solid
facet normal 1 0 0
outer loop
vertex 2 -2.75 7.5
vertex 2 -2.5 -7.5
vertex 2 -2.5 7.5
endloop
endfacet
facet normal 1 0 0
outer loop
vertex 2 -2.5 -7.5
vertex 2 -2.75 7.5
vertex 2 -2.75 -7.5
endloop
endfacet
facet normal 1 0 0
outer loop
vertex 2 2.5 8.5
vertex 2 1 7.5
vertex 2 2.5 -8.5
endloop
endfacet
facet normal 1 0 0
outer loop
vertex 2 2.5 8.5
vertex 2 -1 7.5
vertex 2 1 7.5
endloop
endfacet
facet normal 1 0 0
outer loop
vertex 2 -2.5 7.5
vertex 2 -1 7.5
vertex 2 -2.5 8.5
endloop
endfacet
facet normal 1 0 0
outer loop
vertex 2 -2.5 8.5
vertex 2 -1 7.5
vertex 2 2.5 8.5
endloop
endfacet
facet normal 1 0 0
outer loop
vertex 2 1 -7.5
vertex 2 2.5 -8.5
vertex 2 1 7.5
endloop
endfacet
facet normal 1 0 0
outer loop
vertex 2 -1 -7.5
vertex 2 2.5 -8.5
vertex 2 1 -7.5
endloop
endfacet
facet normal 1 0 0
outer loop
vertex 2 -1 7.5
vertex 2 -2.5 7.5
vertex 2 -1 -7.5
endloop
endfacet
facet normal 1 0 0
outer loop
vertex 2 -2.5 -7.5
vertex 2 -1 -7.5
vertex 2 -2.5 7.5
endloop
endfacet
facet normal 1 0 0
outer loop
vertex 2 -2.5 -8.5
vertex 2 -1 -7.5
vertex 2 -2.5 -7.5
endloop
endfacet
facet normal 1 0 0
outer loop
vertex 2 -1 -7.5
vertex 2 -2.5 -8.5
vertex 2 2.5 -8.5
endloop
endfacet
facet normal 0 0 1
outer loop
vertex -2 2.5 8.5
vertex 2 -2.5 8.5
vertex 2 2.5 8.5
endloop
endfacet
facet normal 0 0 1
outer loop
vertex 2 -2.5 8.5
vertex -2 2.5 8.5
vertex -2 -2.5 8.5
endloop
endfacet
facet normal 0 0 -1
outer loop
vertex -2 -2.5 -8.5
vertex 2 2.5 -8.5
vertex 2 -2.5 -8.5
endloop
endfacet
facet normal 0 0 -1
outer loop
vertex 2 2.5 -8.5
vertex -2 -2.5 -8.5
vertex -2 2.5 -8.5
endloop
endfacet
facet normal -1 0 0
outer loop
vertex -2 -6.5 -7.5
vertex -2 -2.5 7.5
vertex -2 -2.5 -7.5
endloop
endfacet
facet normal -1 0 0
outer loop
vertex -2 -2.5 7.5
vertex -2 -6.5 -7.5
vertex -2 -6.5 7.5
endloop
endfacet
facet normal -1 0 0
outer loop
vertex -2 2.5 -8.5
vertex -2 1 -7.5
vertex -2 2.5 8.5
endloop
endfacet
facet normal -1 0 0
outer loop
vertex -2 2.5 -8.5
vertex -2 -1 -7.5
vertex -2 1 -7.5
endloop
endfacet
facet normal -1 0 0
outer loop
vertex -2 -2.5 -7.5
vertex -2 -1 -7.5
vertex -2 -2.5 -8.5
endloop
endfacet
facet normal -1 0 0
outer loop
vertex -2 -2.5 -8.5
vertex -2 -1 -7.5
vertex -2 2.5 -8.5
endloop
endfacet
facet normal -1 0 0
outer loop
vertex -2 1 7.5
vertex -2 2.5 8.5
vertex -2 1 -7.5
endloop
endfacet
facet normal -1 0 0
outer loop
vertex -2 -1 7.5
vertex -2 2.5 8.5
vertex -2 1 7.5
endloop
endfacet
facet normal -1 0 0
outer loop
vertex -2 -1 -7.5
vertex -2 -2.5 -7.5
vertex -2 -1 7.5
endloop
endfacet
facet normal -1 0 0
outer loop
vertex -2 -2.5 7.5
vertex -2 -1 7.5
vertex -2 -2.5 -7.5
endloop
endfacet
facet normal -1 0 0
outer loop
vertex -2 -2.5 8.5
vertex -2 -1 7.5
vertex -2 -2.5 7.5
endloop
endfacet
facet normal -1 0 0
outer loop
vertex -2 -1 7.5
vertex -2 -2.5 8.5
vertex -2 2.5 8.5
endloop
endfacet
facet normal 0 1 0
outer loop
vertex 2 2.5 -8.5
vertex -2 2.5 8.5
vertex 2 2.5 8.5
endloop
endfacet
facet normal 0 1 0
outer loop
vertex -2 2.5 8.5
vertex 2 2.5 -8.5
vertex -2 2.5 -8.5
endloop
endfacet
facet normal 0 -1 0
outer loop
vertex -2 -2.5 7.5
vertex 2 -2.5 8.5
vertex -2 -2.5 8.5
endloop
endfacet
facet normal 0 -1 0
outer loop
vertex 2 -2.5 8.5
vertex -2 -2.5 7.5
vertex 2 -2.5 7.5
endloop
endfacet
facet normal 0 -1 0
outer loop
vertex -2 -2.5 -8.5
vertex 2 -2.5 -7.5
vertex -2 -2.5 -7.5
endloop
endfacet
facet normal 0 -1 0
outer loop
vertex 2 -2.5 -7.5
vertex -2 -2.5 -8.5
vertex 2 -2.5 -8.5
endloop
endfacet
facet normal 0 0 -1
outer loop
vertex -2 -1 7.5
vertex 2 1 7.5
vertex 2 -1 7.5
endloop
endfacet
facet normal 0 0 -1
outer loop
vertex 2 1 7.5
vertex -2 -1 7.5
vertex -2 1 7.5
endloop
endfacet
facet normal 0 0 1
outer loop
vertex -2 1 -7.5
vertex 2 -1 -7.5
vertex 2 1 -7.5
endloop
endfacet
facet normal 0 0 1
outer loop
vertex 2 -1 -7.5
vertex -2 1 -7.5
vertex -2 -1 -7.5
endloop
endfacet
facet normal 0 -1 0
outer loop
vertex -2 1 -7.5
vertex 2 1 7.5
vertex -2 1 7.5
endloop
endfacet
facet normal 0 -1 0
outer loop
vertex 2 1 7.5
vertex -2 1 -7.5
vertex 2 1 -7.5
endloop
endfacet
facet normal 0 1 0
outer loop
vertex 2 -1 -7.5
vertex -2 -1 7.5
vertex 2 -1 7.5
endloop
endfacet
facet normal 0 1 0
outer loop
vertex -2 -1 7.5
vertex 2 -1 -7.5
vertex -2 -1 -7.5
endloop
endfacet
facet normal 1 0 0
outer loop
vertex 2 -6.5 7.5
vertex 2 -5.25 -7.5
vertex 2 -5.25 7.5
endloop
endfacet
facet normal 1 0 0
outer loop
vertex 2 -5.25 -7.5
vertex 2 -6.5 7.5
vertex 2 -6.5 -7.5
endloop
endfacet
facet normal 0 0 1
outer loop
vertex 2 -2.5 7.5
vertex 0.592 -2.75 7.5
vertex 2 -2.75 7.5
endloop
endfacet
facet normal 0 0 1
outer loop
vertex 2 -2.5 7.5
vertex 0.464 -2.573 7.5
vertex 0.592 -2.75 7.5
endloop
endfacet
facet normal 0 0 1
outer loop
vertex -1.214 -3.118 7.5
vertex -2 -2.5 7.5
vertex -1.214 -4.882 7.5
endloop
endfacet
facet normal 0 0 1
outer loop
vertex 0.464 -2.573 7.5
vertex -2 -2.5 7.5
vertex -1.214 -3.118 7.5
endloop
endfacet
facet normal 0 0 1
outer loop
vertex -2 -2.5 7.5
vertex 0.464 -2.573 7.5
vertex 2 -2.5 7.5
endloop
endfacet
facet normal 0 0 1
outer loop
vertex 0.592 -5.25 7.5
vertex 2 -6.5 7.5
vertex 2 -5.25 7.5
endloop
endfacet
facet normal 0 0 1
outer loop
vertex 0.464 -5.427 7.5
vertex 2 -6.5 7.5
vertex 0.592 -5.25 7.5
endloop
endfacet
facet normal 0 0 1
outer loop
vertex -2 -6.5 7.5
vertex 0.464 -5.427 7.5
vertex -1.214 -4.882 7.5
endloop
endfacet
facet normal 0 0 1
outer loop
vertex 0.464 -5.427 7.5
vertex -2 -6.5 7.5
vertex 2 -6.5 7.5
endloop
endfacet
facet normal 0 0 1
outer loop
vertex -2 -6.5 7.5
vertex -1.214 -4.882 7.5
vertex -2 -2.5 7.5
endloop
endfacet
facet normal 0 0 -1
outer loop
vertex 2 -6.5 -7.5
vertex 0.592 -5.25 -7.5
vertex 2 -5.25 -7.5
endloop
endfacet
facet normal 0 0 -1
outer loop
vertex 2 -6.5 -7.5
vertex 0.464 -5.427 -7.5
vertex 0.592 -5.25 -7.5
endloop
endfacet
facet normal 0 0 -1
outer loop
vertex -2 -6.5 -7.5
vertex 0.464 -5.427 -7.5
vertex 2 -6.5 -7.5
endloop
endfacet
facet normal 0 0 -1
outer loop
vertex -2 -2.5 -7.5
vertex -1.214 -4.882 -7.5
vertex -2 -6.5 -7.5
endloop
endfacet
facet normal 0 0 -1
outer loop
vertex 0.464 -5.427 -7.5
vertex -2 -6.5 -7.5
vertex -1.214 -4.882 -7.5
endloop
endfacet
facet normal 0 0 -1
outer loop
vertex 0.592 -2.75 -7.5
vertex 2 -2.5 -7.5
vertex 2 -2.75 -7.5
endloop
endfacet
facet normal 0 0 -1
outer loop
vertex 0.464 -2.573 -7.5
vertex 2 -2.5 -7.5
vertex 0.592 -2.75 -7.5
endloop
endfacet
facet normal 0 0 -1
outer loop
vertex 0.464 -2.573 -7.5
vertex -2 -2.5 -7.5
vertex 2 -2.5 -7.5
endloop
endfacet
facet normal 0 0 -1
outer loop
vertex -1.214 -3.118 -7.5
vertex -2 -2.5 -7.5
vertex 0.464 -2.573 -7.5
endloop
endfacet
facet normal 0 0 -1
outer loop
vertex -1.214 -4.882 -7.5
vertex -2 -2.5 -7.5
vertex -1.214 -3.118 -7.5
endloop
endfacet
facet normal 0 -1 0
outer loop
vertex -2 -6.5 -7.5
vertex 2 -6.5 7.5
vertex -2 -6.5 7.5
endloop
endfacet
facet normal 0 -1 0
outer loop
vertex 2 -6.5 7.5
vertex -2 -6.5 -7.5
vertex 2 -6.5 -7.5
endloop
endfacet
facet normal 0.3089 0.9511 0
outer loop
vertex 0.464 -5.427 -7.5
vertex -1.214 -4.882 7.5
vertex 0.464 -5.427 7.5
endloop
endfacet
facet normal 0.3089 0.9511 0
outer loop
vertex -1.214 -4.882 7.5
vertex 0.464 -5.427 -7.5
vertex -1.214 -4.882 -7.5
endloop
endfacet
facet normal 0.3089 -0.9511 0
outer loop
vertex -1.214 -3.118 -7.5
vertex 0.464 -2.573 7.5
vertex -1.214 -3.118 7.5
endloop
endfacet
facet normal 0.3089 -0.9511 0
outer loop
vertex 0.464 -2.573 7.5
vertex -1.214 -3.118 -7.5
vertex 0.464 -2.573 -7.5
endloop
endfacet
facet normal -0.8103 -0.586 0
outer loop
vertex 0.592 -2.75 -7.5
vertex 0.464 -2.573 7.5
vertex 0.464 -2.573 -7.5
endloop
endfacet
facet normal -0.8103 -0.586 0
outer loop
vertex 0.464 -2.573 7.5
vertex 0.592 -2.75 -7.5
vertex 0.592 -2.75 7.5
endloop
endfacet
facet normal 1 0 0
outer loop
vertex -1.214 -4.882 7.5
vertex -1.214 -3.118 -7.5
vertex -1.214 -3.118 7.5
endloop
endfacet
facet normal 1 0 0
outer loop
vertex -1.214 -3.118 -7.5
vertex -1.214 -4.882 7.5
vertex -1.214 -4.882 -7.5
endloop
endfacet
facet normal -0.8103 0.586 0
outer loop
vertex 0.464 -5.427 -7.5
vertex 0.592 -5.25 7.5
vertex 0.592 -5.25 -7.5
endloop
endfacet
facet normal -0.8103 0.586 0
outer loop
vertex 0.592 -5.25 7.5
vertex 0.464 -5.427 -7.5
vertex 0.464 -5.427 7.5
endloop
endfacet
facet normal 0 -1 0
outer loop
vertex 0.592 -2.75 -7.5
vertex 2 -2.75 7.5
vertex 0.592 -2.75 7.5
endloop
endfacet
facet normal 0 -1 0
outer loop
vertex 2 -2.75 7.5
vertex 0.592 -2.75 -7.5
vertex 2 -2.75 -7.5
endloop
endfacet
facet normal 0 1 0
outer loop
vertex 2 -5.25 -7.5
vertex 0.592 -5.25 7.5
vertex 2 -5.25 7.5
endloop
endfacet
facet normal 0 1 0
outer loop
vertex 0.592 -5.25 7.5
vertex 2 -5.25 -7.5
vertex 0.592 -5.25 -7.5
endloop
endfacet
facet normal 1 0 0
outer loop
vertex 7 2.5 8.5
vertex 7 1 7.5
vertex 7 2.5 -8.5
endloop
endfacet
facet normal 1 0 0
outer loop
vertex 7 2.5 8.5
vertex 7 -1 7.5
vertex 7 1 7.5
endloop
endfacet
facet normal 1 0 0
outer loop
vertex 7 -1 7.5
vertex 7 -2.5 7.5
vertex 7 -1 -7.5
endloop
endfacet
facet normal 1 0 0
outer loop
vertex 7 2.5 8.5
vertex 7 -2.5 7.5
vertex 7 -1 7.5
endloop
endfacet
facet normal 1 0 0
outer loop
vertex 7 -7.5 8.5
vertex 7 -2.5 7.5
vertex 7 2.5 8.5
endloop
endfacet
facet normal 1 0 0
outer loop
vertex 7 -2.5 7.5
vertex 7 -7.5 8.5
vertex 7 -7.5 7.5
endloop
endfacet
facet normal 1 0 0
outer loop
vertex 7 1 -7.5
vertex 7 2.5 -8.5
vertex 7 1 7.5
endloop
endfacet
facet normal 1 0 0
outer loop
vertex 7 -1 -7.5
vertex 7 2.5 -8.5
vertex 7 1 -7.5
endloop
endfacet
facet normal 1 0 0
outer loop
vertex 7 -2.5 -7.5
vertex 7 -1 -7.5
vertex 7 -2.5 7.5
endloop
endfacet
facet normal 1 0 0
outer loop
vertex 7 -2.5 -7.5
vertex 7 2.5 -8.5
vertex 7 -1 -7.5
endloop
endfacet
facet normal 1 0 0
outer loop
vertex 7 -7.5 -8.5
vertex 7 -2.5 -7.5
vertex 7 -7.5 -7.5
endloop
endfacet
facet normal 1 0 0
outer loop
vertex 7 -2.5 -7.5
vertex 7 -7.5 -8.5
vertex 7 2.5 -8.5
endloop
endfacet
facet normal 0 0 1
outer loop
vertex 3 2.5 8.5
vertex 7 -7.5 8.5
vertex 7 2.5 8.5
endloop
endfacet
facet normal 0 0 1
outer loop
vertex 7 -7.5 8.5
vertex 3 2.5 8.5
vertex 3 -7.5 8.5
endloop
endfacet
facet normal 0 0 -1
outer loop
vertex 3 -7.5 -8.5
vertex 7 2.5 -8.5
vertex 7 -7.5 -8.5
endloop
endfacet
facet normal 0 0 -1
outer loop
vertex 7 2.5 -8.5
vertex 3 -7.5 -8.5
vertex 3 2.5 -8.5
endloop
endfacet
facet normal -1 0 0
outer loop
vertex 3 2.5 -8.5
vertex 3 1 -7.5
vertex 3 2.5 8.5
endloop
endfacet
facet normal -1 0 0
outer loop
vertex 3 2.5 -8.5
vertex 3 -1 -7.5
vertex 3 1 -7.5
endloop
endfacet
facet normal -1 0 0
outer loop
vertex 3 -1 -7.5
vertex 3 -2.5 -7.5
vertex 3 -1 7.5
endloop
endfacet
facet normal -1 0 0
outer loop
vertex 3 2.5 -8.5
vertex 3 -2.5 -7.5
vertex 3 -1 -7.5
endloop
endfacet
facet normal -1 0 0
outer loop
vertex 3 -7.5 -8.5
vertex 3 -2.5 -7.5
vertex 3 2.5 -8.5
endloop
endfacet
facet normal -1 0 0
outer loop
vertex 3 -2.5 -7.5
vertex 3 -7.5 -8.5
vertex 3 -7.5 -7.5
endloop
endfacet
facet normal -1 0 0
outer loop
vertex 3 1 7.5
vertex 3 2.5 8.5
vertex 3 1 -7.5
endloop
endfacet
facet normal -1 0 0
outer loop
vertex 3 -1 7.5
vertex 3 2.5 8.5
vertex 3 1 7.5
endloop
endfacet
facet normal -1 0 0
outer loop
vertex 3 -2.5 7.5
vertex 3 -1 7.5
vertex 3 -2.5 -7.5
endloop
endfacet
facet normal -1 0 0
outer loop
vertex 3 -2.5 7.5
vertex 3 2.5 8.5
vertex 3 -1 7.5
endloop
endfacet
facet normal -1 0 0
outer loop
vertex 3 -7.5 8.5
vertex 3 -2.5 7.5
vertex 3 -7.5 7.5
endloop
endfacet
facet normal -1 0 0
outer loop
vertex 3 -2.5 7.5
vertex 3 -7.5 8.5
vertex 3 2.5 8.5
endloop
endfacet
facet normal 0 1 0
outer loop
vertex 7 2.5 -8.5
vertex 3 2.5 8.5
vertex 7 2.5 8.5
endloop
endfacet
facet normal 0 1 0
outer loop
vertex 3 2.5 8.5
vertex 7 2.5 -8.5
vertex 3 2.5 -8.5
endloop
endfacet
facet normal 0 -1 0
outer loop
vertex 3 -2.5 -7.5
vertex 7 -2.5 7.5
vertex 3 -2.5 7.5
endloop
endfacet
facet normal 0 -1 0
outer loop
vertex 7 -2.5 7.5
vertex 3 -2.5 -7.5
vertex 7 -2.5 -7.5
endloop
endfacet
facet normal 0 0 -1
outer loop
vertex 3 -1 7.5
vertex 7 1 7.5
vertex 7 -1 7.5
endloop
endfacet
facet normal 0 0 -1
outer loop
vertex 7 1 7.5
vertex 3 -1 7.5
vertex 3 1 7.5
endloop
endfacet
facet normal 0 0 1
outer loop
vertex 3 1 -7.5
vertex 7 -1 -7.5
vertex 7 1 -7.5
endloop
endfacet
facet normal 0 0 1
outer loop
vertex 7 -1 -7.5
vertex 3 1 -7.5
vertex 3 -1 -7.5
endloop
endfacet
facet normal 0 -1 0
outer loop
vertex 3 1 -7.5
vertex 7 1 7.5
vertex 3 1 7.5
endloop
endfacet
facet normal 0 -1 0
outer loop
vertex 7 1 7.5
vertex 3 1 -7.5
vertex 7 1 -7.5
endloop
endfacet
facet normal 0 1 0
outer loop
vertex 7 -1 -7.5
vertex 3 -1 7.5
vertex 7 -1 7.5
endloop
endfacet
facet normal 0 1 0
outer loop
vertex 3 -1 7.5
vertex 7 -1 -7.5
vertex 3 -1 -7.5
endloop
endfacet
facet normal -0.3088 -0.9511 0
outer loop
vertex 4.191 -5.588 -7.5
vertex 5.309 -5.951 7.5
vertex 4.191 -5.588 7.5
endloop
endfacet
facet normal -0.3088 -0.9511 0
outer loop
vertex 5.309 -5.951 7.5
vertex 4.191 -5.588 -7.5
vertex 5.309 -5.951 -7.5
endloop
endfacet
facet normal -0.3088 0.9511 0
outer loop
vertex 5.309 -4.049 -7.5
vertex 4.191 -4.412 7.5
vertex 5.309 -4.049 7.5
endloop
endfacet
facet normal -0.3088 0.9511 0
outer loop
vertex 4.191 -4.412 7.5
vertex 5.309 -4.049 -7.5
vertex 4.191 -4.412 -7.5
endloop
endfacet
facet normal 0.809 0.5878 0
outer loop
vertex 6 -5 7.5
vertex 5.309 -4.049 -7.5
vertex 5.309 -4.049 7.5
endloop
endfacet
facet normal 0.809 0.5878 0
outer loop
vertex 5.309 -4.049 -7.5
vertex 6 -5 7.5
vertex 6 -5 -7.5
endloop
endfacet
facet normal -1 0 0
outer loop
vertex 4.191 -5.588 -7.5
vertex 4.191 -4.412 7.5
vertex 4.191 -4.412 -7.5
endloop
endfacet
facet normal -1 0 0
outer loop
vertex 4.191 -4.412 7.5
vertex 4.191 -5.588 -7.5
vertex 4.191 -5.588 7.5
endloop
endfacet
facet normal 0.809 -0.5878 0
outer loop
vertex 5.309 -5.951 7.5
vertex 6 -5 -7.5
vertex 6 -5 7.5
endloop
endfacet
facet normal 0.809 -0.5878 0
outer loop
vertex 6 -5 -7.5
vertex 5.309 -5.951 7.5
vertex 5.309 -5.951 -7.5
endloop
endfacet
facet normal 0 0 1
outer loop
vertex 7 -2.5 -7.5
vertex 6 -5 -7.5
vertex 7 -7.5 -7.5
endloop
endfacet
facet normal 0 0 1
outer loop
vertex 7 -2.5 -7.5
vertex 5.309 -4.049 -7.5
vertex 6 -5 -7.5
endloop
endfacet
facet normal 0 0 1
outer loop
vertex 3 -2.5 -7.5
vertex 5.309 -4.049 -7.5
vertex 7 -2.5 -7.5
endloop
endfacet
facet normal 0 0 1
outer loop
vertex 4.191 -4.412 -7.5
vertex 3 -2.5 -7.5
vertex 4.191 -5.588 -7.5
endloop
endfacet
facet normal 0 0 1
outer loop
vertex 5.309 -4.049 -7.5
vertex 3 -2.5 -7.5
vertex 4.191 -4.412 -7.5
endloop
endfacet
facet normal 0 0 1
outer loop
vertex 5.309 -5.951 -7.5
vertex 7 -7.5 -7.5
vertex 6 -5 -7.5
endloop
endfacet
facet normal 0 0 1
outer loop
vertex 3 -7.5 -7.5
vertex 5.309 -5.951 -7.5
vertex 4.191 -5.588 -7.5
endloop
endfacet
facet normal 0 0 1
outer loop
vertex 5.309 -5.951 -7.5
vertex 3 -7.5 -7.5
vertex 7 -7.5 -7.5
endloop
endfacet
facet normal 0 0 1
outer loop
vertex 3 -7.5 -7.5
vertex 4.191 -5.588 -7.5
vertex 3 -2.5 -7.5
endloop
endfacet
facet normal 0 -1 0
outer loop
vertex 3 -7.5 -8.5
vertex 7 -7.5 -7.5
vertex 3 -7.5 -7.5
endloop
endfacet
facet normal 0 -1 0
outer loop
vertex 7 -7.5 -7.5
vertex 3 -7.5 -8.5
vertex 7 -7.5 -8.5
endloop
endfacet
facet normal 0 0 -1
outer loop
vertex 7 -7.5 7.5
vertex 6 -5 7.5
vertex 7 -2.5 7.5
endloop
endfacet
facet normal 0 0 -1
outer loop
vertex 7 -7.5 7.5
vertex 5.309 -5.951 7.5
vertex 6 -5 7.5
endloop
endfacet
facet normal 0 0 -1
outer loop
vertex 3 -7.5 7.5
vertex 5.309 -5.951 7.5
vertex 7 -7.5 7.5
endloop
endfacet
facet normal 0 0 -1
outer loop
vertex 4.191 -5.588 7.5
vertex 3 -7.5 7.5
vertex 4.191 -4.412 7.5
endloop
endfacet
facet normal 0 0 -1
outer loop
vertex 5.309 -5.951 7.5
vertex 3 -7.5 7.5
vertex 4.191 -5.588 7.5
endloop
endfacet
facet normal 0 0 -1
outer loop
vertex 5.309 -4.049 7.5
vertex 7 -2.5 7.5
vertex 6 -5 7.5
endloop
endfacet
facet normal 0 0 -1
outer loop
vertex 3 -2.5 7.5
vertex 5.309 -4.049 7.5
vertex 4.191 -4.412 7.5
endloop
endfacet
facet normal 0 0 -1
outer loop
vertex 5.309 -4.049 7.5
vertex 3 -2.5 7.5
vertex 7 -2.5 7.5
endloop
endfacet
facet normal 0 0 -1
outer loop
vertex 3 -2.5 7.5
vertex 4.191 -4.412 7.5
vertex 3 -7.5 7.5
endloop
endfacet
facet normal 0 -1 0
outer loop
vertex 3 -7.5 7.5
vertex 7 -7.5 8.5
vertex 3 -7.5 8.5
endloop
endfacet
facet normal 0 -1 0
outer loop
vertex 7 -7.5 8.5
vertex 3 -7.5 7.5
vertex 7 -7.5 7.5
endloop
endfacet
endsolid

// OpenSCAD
// file: ../operators/shortcuts.scad
// Translate
module tra(v) { translate(v) children(); }
module trax(x) { translate([x, 0, 0]) children(); }
module tray(y) { translate([0, y, 0]) children(); }
module traz(z) { translate([0, 0, z]) children(); }

// Scale
module sca(v) { scale(v) children(); }
module scax(x) { scale([x, 1, 1]) children(); }
module scay(y) { scale([1, y, 1]) children(); }
module scaz(z) { scale([1, 1, z]) children(); }

// Rotate
module rot(a, v) { rotate(a, v) children(); }
module rotx(x) { rotate([x, 0, 0]) children(); }
module roty(y) { rotate([0, y, 0]) children(); }
module rotz(z) { rotate([0, 0, z]) children(); }

// Symmetry
module sym(v) { mirror(v) children(); }
module symx() { mirror([1, 0, 0]) children(); }
module symy() { mirror([0, 1, 0]) children(); }
module symz() { mirror([0, 0, 1]) children(); }

// Mirror
module mir(v) { children(); mirror(v) children(); }
module mirx() { children(); mirror([1, 0, 0]) children(); }
module miry() { children(); mirror([0, 1, 0]) children(); }
module mirz() { children(); mirror([0, 0, 1]) children(); }
// main file
include <../operators/shortcuts.scad>

module loop() {
    difference() {
        cube([4, 5, 17], center = true);
        cube([4, 2, 15], center = true);
    }
}

module claspClaw() {
    loop();

    tray(-4) difference() {
        cube([4, 5, 15], center = true);
        cylinder(h = 15, d = 3, center = true);
        trax(1) cube([2, 2.5, 15], center = true);
    }
}

module claspCyl() {
    loop();

    tray(-5) union() {
        cylinder(h = 17, d = 2, center = true);
        traz(-16/2) cube([4, 5, 1], center = true);
        traz(16/2) cube([4, 5, 1], center = true);
    }
}

claspClaw();
trax(5) claspCyl();
